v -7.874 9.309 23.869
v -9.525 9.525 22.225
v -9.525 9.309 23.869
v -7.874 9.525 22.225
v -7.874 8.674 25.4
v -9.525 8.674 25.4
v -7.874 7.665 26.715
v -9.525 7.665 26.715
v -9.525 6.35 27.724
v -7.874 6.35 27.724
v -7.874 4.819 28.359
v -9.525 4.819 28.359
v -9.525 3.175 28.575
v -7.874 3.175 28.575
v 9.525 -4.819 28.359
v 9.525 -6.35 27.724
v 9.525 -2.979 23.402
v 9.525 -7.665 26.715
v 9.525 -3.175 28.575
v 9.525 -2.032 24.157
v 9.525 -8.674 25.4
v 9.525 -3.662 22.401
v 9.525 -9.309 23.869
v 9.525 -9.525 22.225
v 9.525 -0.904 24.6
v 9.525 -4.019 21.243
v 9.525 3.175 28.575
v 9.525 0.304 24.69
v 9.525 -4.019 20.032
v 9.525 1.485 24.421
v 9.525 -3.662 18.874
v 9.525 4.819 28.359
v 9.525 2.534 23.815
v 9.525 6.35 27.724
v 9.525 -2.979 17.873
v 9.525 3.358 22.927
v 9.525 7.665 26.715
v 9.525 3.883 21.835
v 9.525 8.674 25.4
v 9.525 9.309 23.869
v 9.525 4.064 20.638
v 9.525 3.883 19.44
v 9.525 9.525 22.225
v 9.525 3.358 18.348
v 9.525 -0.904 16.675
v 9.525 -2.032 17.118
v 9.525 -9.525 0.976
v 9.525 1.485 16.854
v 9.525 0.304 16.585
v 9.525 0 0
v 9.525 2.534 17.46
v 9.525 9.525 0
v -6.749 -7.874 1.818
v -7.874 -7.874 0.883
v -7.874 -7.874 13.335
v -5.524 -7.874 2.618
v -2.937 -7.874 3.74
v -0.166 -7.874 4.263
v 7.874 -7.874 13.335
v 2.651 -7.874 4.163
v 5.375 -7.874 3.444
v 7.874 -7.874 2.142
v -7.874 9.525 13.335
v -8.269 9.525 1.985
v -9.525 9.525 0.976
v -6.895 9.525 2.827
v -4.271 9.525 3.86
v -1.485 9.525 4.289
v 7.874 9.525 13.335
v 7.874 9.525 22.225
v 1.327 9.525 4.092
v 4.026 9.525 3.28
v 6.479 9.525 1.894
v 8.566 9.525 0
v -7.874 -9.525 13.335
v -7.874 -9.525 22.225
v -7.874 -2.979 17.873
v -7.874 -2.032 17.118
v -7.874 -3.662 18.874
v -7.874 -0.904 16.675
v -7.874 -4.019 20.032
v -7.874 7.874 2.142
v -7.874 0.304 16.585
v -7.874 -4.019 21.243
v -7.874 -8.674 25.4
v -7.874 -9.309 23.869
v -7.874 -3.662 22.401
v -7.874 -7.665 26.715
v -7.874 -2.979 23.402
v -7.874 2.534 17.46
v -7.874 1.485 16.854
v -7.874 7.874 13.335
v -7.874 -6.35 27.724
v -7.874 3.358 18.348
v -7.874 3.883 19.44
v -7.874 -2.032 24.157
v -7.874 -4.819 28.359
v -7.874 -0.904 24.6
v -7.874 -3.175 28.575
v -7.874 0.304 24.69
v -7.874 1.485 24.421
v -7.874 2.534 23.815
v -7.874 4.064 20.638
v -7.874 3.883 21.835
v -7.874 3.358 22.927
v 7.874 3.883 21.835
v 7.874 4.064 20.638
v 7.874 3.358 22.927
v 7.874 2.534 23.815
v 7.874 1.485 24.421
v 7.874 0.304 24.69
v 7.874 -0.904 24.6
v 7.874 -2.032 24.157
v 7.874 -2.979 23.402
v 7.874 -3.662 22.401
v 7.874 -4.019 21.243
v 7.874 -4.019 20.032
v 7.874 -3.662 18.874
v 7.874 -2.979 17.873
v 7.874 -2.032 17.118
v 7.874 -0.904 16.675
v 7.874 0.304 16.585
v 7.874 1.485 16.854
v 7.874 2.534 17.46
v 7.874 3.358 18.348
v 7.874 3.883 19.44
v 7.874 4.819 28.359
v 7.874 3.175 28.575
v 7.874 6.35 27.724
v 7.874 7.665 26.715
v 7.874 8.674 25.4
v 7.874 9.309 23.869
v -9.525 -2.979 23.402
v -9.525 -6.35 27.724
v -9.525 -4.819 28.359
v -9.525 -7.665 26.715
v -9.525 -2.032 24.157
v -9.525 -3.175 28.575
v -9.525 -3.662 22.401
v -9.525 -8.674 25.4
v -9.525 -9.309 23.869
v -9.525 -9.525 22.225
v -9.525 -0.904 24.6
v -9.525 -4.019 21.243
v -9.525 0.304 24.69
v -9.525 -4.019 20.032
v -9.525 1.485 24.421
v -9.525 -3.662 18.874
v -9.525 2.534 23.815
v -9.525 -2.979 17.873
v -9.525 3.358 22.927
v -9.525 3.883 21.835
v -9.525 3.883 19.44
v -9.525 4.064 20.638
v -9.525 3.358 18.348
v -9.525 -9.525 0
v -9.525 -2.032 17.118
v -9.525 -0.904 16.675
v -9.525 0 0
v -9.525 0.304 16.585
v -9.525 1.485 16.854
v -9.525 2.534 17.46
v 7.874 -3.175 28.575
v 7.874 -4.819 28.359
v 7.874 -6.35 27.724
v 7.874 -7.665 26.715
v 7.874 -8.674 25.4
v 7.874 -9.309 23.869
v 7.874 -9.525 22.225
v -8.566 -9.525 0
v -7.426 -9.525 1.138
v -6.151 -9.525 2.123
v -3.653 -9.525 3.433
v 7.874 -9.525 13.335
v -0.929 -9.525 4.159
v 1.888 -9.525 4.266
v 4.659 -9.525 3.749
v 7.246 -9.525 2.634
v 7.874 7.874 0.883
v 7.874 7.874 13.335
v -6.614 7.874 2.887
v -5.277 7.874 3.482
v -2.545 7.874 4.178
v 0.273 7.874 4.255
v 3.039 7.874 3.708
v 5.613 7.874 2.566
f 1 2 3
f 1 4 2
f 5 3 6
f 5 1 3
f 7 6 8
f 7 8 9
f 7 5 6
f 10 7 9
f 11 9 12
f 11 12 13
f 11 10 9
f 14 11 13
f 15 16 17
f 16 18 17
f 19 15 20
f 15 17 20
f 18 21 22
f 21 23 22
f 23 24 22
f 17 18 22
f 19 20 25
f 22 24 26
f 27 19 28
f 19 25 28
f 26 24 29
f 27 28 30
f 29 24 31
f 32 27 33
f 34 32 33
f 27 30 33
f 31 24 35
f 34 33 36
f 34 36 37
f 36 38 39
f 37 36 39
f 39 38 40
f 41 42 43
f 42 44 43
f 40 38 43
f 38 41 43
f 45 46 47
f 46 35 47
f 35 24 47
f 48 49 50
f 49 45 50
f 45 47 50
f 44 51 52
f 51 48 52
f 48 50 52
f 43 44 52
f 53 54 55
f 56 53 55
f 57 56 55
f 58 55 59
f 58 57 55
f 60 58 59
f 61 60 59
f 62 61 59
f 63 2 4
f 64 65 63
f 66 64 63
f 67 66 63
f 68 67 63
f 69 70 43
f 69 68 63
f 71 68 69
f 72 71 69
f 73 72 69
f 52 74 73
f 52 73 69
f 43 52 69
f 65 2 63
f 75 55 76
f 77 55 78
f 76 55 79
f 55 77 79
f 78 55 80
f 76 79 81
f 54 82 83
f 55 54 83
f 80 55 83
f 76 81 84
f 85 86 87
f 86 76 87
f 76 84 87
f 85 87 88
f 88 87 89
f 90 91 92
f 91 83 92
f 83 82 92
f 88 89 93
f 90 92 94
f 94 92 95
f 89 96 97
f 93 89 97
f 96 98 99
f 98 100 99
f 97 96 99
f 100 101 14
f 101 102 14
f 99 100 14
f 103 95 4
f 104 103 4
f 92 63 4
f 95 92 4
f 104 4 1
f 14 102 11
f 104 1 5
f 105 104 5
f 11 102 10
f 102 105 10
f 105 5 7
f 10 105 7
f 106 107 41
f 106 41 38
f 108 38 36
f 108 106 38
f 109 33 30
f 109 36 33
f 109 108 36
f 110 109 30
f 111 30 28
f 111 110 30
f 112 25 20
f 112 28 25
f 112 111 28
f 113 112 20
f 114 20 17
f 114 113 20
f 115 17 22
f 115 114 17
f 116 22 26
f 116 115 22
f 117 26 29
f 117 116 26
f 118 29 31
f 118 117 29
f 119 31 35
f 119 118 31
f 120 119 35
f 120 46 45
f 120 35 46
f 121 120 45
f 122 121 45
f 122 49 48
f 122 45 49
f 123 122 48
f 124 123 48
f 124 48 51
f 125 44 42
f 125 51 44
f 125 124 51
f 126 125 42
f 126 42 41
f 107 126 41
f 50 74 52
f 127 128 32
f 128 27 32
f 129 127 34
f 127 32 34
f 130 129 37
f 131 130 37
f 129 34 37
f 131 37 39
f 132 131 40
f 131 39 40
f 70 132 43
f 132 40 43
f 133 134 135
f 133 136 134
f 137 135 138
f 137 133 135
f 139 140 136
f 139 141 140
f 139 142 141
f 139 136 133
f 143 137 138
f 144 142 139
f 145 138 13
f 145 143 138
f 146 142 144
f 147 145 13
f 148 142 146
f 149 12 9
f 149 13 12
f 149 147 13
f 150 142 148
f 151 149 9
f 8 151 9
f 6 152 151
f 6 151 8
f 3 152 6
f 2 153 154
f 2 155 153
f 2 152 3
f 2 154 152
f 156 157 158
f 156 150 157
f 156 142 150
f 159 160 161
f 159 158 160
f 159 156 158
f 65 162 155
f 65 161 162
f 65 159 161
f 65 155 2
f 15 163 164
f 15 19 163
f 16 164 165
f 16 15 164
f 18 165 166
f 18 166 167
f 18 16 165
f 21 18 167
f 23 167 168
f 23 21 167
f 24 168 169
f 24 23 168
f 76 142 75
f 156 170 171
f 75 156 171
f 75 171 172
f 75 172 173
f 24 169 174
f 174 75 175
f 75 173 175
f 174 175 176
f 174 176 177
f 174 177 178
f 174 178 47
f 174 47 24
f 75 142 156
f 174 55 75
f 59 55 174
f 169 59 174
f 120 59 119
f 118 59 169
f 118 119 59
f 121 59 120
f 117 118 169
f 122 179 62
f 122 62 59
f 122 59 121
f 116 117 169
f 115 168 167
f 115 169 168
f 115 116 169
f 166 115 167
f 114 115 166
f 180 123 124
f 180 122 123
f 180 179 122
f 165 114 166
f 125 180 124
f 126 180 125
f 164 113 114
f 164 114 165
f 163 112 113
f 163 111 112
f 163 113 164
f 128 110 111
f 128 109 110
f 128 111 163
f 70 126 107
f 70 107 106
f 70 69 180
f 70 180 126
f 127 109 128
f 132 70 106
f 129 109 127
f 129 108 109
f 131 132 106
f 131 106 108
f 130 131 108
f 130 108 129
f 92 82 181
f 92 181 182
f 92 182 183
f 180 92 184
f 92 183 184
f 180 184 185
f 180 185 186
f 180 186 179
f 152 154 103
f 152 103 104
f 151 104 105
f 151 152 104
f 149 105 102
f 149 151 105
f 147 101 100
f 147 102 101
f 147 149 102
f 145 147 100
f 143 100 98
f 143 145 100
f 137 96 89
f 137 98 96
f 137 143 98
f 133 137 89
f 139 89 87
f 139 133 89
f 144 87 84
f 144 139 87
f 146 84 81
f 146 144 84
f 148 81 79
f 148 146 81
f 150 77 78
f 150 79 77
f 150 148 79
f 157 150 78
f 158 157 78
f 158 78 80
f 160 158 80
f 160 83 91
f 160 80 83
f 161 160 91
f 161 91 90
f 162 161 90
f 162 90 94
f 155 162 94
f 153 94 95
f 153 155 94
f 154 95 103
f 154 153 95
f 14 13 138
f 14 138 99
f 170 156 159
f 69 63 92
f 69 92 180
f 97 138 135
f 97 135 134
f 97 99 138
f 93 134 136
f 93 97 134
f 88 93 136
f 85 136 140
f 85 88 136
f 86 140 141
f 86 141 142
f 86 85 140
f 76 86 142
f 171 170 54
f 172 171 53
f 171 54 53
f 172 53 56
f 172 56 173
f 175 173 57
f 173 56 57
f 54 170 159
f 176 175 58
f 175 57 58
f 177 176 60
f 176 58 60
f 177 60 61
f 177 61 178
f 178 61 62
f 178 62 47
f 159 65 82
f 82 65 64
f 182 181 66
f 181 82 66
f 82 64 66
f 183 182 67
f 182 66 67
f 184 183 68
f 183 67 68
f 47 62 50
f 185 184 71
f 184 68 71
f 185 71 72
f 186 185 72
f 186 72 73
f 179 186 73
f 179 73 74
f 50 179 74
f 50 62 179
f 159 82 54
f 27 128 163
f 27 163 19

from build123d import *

# Parameters (mm, degrees)
SKETCH1_W               = 19.05
SKETCH1_H               = 19.05
SKETCH1_W_2             = 15.748
SKETCH1_H_2             = 15.748
BOSS_EXTRUDE1_DEPTH     = 28.575
CUT_EXTRUDE2_DEPTH      = 36.639286609
CUT_EXTRUDE2_DEPTH_BACK = 36.639286609
SKETCH3_R               = 4.064
CUT_EXTRUDE4_DEPTH      = 36.639286609
CUT_EXTRUDE4_DEPTH_BACK = 36.639286609
SKETCH4_W               = 15.748
SKETCH4_H               = 15.24
FILLET2_R               = 6.35
CUT_EXTRUDE5_START      = -10.431366523
CUT_EXTRUDE5_DEPTH      = 20.862732946


# Read off the part's stored shape, not the designer's step: Cut-Extrude5
with BuildPart() as part:
    # Sketch1 → Boss-Extrude1 (new body)
    with BuildSketch(Plane.XY):
        Rectangle(SKETCH1_W, SKETCH1_H)
        Rectangle(SKETCH1_W_2, SKETCH1_H_2, mode=Mode.SUBTRACT)
    extrude(amount=BOSS_EXTRUDE1_DEPTH)

    # Sketch3 → Cut-Extrude2 (cut, two sides: drawn at the far end of the back side and taken through both)
    with BuildSketch(Plane(origin=(9.525, 0, 0), x_dir=(0, 0, -1), z_dir=(1, 0, 0)).offset(-CUT_EXTRUDE2_DEPTH_BACK)):
        with Locations(Location((-20.6375, 0, 0), (0, 0, 90))):
            Circle(SKETCH3_R)
    extrude(amount=CUT_EXTRUDE2_DEPTH + CUT_EXTRUDE2_DEPTH_BACK, mode=Mode.SUBTRACT)

    # Sketch4 → Cut-Extrude4 (cut, two sides: drawn at the far end of the back side and taken through both)
    with BuildSketch(Plane.XZ.offset(9.525).offset(-CUT_EXTRUDE4_DEPTH_BACK)):
        with Locations((0, 20.955)):
            Rectangle(SKETCH4_W, SKETCH4_H)
    extrude(amount=CUT_EXTRUDE4_DEPTH + CUT_EXTRUDE4_DEPTH_BACK, mode=Mode.SUBTRACT)

    # Fillet2
    fillet2_edges = [part.edges().sort_by_distance(p)[0] for p in [
        (-8.6995, -9.525, 28.575),
        (8.6995, -9.525, 28.575),
        (-8.6995, 9.525, 28.575),
        (8.6995, 9.525, 28.575),
    ]]
    fillet(fillet2_edges, radius=FILLET2_R)

    # Cut-Extrude5 outline → Cut-Extrude5 (cut)
    with BuildSketch(Plane(origin=(0, 0, 0), x_dir=(0.9949685182509123, 0.10018806161207, 0), z_dir=(0.10018806161207001, -0.9949685182509123, 0)).offset(CUT_EXTRUDE5_START)):
        with BuildLine():
            add(Edge.make_bspline(
                [(-9.477075136, 0), (0, 10.800334816), (9.477075136, 0)],
                knots=[5.435123228, 5.435123228, 5.435123228, 7.131247386, 7.131247386, 7.131247386], degree=2, weights=[1, 0.661437828, 1]))
            Line((-9.477075136, 0), (9.477075136, 0))
        make_face()
    extrude(amount=CUT_EXTRUDE5_DEPTH, mode=Mode.SUBTRACT)


solid = part.part
